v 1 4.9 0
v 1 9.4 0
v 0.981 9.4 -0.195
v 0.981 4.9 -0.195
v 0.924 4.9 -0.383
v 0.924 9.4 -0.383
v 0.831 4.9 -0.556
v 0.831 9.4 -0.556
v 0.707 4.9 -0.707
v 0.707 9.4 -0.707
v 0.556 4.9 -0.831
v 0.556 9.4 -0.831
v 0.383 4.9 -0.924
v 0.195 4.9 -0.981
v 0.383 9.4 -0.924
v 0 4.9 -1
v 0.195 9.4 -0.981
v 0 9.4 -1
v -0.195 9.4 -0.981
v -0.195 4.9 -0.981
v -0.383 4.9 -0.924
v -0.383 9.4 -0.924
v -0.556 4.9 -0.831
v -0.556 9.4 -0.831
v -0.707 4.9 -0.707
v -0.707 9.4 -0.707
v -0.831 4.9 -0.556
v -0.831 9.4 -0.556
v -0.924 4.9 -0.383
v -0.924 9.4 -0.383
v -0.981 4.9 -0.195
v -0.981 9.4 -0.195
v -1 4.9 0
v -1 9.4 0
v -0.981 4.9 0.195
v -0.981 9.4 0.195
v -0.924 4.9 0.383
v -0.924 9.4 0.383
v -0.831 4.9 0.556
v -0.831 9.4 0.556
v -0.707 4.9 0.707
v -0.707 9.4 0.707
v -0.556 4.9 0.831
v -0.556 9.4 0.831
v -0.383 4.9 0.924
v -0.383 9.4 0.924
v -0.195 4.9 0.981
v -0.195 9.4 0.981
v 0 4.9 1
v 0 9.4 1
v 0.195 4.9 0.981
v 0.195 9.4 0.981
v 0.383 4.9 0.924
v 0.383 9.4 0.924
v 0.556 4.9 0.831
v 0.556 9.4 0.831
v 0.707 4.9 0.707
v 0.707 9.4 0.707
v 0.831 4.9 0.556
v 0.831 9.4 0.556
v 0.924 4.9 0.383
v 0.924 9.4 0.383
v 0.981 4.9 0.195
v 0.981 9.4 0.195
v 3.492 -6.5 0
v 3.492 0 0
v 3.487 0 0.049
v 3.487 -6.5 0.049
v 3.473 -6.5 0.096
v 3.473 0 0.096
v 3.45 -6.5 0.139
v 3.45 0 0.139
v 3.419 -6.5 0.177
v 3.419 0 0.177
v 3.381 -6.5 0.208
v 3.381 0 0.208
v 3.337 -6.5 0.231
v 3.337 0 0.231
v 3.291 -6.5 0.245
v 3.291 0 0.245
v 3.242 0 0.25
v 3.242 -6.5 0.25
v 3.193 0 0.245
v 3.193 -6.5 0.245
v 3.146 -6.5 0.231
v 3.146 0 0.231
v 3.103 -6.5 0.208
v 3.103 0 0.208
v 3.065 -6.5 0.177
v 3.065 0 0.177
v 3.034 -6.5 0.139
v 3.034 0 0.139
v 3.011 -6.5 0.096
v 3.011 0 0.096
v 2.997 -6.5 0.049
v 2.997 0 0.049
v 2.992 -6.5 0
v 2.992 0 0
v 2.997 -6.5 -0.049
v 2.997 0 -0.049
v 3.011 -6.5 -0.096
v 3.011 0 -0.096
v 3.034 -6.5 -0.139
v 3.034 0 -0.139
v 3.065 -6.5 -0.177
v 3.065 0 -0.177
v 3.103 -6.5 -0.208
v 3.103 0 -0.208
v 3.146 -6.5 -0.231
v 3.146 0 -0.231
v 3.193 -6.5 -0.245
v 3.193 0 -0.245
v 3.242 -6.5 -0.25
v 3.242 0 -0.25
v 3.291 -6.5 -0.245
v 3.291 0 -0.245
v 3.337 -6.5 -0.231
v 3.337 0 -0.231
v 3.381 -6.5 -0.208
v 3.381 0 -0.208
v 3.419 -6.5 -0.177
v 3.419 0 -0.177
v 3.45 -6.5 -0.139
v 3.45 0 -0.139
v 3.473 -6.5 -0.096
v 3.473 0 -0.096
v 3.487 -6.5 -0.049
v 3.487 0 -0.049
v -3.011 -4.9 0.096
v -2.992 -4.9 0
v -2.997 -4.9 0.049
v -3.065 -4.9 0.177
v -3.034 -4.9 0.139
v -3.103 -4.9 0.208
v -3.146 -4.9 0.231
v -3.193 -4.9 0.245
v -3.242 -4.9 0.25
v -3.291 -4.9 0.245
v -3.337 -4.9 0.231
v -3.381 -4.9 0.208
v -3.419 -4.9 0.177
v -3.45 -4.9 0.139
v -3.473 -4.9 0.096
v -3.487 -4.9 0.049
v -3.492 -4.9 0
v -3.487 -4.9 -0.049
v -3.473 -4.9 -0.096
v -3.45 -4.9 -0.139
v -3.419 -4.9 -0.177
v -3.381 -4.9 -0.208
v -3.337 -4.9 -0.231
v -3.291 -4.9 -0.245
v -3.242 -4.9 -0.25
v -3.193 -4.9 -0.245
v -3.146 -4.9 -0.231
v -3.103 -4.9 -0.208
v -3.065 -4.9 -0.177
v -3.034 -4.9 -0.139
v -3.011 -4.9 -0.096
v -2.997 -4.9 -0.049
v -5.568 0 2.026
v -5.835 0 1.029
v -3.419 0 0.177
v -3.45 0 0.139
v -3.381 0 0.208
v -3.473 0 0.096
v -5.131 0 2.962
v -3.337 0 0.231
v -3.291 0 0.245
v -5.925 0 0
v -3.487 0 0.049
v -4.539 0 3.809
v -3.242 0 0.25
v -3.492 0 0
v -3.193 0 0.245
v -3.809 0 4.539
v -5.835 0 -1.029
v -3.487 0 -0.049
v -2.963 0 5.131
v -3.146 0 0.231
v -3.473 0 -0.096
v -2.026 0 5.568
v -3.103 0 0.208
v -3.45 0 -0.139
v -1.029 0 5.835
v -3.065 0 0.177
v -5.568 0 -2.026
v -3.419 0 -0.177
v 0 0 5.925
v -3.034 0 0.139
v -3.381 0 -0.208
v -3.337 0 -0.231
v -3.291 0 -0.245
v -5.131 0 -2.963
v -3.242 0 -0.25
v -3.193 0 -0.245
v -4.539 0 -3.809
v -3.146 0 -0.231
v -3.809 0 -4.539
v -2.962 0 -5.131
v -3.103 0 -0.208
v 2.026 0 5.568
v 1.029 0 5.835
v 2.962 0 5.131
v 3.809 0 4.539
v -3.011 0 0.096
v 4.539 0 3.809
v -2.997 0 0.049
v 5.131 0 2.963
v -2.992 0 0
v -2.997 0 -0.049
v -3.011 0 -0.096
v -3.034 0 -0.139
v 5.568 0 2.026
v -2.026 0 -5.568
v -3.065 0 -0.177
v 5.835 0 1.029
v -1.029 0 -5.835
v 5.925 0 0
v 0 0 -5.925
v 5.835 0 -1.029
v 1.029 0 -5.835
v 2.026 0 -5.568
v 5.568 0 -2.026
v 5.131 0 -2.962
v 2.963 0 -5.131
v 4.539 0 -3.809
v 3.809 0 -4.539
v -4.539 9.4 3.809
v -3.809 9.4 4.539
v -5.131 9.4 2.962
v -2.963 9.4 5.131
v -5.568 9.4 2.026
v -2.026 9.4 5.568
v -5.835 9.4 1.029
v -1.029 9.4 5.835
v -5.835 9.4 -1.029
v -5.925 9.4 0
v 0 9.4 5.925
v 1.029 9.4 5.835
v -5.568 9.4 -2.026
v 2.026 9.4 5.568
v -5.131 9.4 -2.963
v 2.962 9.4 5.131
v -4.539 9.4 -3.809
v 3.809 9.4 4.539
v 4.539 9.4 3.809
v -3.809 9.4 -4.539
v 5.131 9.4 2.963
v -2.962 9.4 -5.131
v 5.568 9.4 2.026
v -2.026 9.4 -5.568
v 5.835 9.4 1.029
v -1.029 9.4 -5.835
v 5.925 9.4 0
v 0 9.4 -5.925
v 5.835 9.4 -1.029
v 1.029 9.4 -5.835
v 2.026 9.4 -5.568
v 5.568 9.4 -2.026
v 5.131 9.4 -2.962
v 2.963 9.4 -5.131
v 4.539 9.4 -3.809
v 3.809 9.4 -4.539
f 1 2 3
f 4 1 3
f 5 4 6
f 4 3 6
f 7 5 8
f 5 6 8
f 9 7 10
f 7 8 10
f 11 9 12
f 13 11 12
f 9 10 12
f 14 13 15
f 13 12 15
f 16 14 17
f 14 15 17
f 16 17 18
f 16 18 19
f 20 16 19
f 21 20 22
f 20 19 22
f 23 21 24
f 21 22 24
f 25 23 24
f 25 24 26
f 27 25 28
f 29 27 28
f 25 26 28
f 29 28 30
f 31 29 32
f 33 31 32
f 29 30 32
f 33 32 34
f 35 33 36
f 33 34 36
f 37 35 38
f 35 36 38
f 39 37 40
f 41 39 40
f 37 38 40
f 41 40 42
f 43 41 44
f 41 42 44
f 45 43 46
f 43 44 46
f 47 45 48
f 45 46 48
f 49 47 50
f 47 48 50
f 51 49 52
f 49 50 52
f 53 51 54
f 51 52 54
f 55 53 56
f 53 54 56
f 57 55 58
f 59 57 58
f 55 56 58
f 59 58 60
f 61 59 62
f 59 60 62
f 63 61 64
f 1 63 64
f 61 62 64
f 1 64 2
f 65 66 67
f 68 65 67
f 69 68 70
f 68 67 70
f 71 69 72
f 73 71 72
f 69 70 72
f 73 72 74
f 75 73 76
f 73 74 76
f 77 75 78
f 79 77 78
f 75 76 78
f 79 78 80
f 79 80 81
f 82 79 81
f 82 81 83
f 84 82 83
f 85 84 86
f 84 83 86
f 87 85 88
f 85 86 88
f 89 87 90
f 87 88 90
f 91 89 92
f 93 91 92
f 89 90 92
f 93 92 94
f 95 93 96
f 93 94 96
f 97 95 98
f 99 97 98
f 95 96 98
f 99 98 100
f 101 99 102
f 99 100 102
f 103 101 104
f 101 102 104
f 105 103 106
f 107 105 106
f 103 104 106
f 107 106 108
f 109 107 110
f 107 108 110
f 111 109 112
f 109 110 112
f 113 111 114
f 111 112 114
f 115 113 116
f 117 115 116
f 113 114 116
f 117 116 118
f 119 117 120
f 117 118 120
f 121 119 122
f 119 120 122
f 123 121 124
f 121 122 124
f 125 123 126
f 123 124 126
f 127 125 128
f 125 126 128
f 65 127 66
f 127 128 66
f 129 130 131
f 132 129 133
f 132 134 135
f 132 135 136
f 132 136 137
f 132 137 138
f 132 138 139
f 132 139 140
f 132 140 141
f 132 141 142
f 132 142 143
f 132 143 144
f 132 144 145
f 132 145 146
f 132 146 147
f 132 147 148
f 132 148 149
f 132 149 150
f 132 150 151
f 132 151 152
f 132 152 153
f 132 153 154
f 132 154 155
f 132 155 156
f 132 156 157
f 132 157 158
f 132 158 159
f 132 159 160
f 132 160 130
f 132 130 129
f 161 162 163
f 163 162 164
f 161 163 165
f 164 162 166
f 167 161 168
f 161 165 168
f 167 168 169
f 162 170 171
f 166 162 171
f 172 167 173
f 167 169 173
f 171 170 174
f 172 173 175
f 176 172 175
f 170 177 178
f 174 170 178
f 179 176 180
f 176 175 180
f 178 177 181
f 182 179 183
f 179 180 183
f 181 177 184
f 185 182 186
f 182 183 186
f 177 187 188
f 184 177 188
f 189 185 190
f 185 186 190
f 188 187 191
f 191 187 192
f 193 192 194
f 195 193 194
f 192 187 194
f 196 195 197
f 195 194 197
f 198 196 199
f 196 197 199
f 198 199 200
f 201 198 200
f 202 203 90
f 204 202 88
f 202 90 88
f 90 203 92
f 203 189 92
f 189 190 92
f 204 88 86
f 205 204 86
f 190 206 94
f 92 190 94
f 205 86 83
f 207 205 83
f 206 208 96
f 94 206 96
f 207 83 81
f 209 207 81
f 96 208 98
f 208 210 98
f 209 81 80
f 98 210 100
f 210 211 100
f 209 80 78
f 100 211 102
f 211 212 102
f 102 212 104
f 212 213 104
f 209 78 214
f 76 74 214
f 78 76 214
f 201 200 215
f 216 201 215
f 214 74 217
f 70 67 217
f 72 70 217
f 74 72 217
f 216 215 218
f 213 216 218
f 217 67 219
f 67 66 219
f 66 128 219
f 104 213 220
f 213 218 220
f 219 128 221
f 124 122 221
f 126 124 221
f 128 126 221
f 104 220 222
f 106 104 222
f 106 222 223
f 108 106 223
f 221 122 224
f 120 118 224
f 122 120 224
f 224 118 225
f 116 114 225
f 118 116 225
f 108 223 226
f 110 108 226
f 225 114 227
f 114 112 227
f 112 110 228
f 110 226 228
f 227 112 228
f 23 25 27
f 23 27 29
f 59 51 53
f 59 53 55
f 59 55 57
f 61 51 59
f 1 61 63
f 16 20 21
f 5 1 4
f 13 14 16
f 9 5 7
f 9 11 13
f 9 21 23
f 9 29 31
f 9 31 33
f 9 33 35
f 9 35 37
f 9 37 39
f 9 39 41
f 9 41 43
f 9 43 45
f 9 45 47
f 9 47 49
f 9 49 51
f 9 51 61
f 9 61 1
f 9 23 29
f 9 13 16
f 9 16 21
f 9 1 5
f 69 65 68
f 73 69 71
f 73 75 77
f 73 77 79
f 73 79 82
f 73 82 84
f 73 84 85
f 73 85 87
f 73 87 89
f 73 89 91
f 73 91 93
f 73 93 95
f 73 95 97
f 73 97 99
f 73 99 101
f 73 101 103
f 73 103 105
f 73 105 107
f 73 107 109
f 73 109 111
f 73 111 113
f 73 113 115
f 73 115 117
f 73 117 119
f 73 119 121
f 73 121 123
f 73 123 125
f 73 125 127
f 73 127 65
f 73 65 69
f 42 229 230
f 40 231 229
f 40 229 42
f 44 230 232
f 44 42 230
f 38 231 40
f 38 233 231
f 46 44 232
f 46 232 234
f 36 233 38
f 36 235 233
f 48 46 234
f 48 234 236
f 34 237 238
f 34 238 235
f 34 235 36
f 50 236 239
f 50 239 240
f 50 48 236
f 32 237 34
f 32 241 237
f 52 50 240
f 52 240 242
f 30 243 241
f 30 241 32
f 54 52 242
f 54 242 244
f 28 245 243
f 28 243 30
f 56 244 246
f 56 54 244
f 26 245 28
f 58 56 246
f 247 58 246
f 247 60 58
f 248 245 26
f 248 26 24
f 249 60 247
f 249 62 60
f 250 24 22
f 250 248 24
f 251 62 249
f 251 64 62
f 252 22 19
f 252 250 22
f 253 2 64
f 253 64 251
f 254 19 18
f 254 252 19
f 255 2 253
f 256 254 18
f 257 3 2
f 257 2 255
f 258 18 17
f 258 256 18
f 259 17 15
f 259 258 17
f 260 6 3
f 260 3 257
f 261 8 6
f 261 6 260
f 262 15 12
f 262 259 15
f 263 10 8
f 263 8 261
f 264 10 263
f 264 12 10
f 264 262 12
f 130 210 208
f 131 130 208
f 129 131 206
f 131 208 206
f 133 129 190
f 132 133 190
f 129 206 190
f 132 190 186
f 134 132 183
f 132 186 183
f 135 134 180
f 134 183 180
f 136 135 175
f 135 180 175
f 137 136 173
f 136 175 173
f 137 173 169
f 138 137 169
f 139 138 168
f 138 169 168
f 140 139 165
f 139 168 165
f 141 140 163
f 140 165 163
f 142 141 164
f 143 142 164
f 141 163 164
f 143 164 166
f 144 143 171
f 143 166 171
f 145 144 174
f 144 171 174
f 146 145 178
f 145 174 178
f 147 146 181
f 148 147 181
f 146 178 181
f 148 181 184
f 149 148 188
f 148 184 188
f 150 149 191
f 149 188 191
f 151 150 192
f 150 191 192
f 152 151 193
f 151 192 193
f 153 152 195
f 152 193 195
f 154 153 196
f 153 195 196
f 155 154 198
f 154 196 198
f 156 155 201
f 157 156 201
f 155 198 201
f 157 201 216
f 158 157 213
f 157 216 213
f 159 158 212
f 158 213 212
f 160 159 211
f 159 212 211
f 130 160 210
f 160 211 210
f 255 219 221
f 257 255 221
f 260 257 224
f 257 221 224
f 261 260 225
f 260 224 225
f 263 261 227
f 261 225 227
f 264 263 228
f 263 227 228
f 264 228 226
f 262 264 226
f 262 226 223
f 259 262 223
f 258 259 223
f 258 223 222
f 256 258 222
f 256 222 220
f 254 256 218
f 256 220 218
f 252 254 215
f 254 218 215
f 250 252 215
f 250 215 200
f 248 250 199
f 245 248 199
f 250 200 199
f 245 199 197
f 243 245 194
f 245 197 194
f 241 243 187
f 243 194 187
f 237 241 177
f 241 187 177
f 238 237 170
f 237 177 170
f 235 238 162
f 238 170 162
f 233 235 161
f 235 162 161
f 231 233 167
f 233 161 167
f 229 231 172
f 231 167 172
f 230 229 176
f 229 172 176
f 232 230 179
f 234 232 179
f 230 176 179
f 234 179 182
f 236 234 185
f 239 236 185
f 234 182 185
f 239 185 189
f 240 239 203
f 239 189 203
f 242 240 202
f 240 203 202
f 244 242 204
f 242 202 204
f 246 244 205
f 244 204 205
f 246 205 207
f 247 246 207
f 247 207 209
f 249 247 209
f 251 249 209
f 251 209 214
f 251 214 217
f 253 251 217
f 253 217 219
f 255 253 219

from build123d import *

# Parameters (mm, degrees)
CROQUIS1_R              = 5.925
SALIENTE_EXTRUIR1_DEPTH = 9.4
CROQUIS2_R              = 0.25
SALIENTE_EXTRUIR2_DEPTH = 4.9
CROQUIS3_R              = 0.25
SALIENTE_EXTRUIR3_DEPTH = 6.5
CROQUIS4_R              = 1
CORTAR_EXTRUIR1_DEPTH   = 4.5


with BuildPart() as part:
    # Croquis1 → Saliente-Extruir1 (new body)
    with BuildSketch(Plane(origin=(0, 0, 0), x_dir=(1, 0, 0), z_dir=(0, 1, 0))):
        Circle(CROQUIS1_R)
    extrude(amount=SALIENTE_EXTRUIR1_DEPTH)

    # Croquis2 → Saliente-Extruir2 (add)
    with BuildSketch(Plane.XZ):
        with Locations((-3.241786254, 0)):
            Circle(CROQUIS2_R)
    extrude(amount=SALIENTE_EXTRUIR2_DEPTH)

    # Croquis3 → Saliente-Extruir3 (add)
    with BuildSketch(Plane.XZ):
        with Locations((3.241786254, 0)):
            Circle(CROQUIS3_R)
    extrude(amount=SALIENTE_EXTRUIR3_DEPTH)

    # Croquis4 → Cortar-Extruir1 (cut)
    with BuildSketch(Plane(origin=(0, 9.4, 0), x_dir=(1, 0, 0), z_dir=(0, 1, 0))):
        Circle(CROQUIS4_R)
    extrude(amount=-CORTAR_EXTRUIR1_DEPTH, mode=Mode.SUBTRACT)


solid = part.part
